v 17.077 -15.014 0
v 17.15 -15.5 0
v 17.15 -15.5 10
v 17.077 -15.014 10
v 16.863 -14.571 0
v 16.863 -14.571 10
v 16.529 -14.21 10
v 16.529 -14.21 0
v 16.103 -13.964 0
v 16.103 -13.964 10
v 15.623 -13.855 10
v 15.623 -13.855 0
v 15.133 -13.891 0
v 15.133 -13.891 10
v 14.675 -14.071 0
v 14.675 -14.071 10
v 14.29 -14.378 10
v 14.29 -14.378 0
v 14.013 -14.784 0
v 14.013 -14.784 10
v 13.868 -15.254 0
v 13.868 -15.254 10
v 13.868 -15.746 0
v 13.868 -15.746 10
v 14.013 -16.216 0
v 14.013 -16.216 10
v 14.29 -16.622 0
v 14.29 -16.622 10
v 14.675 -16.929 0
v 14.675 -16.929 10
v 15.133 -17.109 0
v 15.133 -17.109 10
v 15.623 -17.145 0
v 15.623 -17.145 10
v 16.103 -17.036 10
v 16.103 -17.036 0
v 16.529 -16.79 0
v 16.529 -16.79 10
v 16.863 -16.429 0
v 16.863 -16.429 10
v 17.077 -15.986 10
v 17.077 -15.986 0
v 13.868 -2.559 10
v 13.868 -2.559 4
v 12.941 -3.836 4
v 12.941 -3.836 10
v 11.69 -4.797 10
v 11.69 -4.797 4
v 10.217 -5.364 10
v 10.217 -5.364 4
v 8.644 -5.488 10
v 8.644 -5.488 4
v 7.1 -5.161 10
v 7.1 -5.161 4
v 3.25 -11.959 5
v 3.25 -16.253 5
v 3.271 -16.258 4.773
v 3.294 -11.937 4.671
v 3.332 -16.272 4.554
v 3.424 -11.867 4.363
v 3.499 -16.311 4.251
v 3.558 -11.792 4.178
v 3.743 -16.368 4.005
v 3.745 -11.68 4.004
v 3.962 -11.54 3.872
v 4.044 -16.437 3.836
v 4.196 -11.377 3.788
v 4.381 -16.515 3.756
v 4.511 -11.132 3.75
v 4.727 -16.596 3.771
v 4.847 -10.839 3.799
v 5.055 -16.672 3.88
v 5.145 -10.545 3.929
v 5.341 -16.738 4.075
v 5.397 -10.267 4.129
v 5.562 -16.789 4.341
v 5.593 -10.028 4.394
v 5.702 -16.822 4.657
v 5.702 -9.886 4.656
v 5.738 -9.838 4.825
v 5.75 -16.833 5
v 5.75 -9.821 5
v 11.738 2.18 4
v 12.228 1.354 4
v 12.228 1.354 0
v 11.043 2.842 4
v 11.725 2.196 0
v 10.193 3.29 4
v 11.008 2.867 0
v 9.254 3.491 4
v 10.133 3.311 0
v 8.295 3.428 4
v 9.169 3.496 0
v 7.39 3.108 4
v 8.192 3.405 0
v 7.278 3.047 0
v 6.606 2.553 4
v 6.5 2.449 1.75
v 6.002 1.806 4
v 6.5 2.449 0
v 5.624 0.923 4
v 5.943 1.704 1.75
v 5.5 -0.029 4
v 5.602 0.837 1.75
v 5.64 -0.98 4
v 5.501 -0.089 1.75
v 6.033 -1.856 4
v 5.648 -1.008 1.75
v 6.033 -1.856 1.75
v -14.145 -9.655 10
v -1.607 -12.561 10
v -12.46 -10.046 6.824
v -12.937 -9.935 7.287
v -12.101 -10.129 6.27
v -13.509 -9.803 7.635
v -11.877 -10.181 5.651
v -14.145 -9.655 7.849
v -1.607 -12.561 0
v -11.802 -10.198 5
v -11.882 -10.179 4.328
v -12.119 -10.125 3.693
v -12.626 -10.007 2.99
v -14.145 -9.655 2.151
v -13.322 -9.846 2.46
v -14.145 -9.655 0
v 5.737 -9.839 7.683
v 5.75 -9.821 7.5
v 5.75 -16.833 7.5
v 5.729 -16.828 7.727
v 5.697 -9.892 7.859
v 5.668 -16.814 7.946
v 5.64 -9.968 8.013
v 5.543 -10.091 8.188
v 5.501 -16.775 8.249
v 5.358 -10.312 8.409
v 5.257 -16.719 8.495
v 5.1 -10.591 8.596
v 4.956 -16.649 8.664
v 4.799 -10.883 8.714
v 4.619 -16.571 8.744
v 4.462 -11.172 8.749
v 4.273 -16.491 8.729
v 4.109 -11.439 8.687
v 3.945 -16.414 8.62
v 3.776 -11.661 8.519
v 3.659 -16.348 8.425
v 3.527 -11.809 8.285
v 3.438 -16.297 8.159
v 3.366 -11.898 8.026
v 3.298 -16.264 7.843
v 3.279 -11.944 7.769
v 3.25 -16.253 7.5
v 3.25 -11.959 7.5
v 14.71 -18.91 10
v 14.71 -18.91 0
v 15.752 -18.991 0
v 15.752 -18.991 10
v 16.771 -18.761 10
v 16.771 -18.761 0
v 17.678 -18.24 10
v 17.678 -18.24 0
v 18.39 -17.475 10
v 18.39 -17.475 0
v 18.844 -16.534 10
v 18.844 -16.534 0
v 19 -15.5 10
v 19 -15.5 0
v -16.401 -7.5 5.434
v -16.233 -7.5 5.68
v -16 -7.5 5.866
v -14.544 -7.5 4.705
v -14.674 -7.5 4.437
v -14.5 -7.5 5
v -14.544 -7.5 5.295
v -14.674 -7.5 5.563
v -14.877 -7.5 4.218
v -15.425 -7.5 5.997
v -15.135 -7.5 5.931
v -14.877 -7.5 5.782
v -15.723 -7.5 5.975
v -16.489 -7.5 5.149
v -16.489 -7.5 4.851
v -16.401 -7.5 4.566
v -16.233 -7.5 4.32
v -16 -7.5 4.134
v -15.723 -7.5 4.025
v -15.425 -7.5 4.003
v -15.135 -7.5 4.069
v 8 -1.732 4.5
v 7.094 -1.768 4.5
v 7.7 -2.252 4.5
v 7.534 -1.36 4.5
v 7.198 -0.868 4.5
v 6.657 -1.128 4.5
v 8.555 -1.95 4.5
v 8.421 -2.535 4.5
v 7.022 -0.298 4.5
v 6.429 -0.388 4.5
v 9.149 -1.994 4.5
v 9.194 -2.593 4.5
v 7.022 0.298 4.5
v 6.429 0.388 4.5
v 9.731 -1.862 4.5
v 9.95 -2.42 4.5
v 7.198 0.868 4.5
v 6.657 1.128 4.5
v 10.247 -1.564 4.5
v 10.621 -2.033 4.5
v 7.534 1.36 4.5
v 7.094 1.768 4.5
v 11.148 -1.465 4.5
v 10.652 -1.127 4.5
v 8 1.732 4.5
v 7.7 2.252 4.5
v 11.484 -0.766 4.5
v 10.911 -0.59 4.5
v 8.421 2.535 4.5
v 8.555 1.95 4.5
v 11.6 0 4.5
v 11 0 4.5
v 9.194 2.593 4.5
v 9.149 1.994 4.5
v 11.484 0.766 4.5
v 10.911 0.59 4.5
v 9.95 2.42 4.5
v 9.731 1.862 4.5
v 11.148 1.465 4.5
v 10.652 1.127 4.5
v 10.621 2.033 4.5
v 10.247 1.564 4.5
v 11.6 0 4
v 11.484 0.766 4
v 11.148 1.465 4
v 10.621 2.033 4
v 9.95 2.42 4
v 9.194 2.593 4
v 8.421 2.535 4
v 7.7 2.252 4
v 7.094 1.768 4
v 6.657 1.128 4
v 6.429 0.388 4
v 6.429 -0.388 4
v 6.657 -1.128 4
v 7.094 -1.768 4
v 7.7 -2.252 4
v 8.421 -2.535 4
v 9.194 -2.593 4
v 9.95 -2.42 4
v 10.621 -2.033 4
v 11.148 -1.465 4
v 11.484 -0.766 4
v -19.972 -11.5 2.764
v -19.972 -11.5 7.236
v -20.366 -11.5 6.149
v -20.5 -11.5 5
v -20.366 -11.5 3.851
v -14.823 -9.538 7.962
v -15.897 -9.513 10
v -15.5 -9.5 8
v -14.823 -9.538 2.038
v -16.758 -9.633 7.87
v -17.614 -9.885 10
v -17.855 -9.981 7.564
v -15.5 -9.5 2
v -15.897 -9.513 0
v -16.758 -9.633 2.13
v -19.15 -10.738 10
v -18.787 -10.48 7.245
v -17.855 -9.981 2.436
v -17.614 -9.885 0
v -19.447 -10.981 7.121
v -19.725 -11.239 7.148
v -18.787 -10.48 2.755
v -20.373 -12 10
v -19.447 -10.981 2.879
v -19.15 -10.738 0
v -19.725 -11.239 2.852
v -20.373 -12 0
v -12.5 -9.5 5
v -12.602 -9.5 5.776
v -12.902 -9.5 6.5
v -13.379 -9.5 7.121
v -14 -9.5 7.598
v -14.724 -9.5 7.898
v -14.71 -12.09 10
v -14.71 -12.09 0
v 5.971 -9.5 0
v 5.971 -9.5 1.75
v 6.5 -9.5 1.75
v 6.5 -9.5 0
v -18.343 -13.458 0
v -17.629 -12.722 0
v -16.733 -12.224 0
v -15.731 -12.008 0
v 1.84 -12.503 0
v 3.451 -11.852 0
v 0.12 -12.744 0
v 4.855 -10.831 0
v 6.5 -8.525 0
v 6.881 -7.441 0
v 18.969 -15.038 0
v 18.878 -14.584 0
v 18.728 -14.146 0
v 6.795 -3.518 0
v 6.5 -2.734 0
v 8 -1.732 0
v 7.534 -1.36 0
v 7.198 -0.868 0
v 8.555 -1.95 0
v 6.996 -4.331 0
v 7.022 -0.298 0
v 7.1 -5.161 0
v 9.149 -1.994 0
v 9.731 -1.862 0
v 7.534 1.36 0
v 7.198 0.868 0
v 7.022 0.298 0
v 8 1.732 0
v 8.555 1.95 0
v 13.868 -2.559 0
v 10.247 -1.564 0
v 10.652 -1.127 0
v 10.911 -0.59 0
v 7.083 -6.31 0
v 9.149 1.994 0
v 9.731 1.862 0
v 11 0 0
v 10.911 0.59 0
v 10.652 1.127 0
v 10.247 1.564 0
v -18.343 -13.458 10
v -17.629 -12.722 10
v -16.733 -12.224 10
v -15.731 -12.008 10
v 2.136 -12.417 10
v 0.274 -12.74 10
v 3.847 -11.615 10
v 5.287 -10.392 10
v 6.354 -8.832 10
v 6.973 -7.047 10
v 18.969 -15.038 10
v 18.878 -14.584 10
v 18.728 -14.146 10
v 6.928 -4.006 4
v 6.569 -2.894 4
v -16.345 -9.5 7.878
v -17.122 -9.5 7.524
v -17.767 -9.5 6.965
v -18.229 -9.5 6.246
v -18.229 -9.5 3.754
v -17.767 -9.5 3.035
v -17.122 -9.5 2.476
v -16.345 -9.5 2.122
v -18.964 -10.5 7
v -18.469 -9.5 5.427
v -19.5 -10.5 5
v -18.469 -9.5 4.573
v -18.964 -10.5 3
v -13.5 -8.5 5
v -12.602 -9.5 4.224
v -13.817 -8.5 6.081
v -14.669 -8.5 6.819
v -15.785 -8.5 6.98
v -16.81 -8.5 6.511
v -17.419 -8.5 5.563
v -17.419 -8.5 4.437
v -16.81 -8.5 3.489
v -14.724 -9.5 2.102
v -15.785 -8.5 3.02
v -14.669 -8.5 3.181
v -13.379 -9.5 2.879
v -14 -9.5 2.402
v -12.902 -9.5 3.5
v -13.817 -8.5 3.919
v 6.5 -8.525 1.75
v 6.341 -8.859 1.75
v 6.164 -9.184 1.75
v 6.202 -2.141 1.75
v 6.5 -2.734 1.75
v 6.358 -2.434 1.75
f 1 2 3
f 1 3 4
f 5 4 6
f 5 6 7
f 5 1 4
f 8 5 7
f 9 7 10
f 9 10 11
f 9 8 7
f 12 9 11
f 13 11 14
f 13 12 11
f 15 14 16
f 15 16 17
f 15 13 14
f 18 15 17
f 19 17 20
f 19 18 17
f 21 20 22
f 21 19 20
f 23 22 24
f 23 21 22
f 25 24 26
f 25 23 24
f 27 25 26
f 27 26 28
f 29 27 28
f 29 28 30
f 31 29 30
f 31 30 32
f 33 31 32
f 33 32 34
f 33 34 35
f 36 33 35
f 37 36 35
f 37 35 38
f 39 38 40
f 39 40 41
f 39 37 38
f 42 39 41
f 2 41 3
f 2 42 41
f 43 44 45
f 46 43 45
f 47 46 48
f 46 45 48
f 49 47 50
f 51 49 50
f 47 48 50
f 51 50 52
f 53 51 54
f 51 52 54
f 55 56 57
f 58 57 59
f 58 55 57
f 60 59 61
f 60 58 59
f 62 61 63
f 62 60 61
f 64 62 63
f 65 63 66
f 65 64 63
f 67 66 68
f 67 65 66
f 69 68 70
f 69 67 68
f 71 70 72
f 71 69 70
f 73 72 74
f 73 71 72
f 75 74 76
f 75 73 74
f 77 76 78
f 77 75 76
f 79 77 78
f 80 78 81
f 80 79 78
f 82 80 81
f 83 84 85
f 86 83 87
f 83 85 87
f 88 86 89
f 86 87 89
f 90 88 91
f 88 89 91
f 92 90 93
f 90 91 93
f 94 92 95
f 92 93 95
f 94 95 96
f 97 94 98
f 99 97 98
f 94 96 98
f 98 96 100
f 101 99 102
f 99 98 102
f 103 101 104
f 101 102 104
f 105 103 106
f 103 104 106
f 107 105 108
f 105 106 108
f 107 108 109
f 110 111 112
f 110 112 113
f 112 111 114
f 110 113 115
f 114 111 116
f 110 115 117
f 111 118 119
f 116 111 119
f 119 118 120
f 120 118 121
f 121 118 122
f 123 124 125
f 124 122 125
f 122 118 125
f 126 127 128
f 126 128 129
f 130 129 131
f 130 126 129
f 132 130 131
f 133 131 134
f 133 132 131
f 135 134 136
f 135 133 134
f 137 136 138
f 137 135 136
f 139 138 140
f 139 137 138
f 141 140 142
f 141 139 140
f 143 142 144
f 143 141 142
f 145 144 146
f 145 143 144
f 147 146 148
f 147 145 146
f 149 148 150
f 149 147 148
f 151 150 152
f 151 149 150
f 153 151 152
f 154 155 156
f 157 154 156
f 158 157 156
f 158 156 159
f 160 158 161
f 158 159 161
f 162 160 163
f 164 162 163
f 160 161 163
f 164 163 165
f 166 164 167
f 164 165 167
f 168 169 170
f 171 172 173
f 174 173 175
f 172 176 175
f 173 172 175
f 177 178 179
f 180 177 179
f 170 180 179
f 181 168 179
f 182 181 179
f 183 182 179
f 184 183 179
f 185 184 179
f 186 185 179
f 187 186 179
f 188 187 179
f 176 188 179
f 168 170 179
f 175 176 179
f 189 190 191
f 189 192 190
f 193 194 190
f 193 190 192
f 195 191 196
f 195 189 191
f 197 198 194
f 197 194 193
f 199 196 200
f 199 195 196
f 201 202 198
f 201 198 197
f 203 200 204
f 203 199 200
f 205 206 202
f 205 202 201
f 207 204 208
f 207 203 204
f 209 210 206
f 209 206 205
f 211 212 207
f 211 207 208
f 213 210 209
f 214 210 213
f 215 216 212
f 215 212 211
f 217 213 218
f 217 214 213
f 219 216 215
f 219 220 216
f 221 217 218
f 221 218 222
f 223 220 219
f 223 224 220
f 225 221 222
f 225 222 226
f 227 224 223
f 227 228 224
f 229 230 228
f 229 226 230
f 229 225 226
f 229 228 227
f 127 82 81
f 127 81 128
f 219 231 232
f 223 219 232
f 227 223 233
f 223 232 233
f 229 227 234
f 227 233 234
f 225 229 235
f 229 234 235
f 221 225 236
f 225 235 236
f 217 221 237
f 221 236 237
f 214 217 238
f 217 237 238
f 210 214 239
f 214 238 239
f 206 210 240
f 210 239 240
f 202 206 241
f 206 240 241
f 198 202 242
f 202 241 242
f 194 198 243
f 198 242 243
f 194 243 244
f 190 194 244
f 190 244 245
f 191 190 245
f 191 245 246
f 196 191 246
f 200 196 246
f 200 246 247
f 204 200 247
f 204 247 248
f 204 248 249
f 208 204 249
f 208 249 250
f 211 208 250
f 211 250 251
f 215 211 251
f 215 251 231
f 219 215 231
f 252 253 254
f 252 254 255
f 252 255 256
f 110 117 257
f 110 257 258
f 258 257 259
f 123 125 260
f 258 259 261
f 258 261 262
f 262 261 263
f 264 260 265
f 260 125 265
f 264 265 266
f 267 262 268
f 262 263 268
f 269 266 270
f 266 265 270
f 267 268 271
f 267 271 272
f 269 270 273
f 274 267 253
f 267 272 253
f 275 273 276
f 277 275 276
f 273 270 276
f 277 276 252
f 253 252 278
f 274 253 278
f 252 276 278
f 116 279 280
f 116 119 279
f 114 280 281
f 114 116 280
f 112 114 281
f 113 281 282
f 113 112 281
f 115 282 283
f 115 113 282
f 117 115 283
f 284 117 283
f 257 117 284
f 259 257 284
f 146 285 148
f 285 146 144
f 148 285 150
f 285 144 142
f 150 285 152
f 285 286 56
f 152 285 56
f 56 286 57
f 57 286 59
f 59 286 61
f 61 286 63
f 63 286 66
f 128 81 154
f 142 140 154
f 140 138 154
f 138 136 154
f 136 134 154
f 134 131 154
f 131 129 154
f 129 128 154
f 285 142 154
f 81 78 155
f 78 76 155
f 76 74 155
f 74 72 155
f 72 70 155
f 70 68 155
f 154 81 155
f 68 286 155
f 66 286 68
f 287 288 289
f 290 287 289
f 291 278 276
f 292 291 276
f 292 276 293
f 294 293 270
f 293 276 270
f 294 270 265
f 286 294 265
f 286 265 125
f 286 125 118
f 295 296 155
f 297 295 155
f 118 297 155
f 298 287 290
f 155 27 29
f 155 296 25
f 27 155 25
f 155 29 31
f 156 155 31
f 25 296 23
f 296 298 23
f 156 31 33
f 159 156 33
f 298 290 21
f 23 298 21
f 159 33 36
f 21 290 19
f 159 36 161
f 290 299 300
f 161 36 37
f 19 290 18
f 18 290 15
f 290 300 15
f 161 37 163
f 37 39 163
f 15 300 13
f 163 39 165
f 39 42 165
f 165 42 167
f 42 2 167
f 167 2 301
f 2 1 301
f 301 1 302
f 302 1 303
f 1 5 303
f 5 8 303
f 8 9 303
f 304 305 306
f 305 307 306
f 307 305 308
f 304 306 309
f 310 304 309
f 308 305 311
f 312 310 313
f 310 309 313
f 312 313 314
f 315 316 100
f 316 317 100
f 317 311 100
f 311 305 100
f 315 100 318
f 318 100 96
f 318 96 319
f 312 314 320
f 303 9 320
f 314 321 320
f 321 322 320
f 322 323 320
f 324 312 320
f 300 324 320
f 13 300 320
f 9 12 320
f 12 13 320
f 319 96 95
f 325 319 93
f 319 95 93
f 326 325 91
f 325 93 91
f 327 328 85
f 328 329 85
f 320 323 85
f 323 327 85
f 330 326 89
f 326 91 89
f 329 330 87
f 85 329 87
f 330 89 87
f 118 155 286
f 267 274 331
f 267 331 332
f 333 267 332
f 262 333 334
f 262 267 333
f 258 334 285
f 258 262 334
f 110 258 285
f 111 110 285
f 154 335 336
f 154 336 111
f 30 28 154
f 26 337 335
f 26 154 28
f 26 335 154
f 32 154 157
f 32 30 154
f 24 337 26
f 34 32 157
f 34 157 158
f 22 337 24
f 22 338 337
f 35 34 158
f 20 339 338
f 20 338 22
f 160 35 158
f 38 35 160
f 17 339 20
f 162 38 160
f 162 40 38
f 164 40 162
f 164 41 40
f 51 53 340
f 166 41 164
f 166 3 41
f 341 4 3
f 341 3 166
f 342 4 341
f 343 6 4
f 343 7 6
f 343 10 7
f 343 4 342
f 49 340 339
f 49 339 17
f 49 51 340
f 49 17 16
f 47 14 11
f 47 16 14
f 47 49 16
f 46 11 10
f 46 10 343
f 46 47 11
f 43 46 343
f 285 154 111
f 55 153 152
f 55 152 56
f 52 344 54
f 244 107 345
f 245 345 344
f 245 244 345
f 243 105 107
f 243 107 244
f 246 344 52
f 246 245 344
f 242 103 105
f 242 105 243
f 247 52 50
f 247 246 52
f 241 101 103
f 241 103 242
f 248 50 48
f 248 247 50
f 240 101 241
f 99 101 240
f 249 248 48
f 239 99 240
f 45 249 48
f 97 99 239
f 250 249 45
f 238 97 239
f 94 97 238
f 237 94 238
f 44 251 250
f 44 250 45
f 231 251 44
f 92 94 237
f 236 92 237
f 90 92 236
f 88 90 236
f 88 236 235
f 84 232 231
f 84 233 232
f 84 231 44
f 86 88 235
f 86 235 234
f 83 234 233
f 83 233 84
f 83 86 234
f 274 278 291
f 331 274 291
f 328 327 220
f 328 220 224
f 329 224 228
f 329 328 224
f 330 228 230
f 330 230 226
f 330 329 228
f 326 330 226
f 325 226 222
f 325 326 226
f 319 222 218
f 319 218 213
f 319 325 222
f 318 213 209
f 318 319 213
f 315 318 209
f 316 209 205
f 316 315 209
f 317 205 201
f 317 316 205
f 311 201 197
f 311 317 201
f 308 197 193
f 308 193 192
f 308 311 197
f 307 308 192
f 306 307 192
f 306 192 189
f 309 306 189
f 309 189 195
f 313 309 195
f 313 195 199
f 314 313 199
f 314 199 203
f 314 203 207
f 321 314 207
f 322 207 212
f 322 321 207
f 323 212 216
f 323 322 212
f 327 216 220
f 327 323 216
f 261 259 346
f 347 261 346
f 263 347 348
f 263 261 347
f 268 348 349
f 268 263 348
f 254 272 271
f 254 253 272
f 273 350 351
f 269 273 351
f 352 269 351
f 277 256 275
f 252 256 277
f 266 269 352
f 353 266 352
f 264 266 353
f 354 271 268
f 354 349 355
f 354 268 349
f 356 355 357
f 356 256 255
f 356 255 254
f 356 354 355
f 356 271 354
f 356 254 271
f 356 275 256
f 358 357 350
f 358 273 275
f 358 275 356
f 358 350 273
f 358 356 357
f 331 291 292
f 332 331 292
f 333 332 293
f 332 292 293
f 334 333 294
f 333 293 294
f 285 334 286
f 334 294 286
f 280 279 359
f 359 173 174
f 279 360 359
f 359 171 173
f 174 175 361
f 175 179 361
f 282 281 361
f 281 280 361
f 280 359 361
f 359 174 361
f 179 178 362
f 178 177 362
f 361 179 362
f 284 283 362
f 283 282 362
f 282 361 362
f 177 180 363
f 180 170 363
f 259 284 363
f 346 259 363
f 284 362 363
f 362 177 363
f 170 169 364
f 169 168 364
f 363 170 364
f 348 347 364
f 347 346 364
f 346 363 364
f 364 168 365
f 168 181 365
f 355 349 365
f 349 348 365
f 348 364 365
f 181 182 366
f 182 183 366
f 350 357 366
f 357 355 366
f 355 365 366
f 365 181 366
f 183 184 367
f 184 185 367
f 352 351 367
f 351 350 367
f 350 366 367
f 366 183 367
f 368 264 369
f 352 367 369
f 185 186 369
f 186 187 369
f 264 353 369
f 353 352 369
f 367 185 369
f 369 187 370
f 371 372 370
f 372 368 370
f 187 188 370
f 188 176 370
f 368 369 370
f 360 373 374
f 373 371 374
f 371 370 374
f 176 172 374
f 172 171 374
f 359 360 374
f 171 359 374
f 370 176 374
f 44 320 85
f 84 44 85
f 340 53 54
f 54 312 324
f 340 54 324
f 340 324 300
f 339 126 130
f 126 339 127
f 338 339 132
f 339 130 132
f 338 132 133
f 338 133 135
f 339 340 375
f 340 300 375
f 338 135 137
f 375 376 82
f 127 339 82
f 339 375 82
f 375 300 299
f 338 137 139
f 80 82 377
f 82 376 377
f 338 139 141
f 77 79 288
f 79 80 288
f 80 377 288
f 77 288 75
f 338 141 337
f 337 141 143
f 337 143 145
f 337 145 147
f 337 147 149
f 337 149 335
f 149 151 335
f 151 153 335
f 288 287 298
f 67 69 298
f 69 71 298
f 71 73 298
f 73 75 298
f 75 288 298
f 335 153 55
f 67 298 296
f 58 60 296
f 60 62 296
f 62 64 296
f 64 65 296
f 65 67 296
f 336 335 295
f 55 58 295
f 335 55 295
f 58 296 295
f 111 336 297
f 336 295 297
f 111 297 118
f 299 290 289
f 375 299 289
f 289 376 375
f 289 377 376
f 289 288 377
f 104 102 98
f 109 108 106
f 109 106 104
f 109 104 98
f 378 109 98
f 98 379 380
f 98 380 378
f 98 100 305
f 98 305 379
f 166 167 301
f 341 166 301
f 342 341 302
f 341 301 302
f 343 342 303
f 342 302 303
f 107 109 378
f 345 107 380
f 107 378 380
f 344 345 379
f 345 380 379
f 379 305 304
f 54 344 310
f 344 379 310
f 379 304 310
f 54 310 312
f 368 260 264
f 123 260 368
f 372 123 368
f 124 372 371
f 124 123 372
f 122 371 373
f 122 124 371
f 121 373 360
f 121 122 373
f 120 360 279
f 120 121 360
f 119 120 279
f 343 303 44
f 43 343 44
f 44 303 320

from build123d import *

# Parameters (mm, degrees)
F0_R          = 1.65
F1_DEPTH      = 10
F0_R_2        = 2.6
F2_DEPTH      = 4
F0_R_3        = 2
F3_DEPTH      = 4.5
F5_R          = 3
F6_DEPTH      = 2
F6_TAPER      = 45
F6_DEPTH_BACK = 2
F6_TAPER_BACK = -45
F7_DEPTH      = 25
F5_W          = 2
F5_H          = 1.75
F8_DEPTH      = 25


with BuildPart() as f1:
    # F0 (on Top) → F1 (new body)
    with BuildSketch(Plane.XY):
        with BuildLine():
            ThreePointArc((14.7096774194, -18.9096026482), (12.824730257, -13.2432475097), (18.7276803364, -14.1464566331))
            Line((18.7276803364, -14.1464566331), (13.8684226679, -2.5589960389))
            ThreePointArc((13.8684226679, -2.5589960389), (10.9739243006, -5.1335779779), (7.1001902802, -5.1614652017))
            ThreePointArc((7.1001902802, -5.1614652017), (4.6080160796, -11.0514527236), (-1.6067478385, -12.5612853954))
            Line((-1.6067478385, -12.5612853954), (-14.1451612903, -9.6549668888))
            ThreePointArc((-14.1451612903, -9.6549668888), (-17.6142039843, -9.8848293425), (-20.3733971724, -12))
            Line((-20.3733971724, -12), (-18.3428150172, -13.4583333333))
            ThreePointArc((-18.3428150172, -13.4583333333), (-16.7332856575, -12.2244837831), (-14.7096774194, -12.0903973518))
            Line((-14.7096774194, -12.0903973518), (14.7096774194, -18.9096026482))
        make_face()
        with BuildLine():
            ThreePointArc((14.7096774194, -18.9096026482), (17.6775985589, -18.2400847644), (19, -15.5))
            ThreePointArc((19, -15.5), (18.9312447579, -14.8096671735), (18.7276803364, -14.1464566331))
            ThreePointArc((18.7276803364, -14.1464566331), (12.824730257, -13.2432475097), (14.7096774194, -18.9096026482))
        make_face()
        with Locations((15.5, -15.5)):
            Circle(F0_R, mode=Mode.SUBTRACT)
    extrude(amount=F1_DEPTH)

    # F0 (on Top) → F2 (join)
    with BuildSketch(Plane.XY):
        with BuildLine():
            ThreePointArc((7.1001902802, -5.1614652017), (10.9739243006, -5.1335779779), (13.8684226679, -2.5589960389))
            Line((13.8684226679, -2.5589960389), (12.2276803364, 1.3535433669))
            ThreePointArc((12.2276803364, 1.3535433669), (7.3899296254, 3.1076797436), (6.0326682233, -1.856055529))
            ThreePointArc((6.0326682233, -1.856055529), (6.7712204508, -3.4426205691), (7.1001902802, -5.1614652017))
        make_face()
        with Locations((9, 0)):
            Circle(F0_R_2, mode=Mode.SUBTRACT)
    extrude(amount=F2_DEPTH)

    # F0 (on Top) → F3 (join)
    with BuildSketch(Plane.XY):
        with Locations((9, 0)):
            Circle(F0_R_2)
        with Locations((9, 0)):
            Circle(F0_R_3, mode=Mode.SUBTRACT)
    extrude(amount=F3_DEPTH)

    # F5 (on offset) → F6 (join, two sides)
    with BuildSketch(Plane.XZ.offset(9.5)) as f6_sk:
        with Locations((-15.5, 5)):
            Circle(F5_R)
    extrude(amount=-F6_DEPTH, taper=F6_TAPER)
    extrude(f6_sk.sketch, amount=F6_DEPTH_BACK, taper=F6_TAPER_BACK)

    # F5 (on offset) → F7 (cut)
    with BuildSketch(Plane.XZ.offset(9.5)):
        with BuildLine():
            ThreePointArc((4.5000000108, 6.25), (3.6161165273, 5.8838834803), (3.25, 5))
            ThreePointArc((3.25, 5), (4.5, 3.75), (5.75, 5))
            ThreePointArc((5.75, 5), (5.3838834803, 5.8838834727), (4.5000000108, 6.25))
        make_face()
        with BuildLine():
            ThreePointArc((3.25, 7.5), (3.6161165273, 6.6161165197), (4.5000000108, 6.25))
            ThreePointArc((4.5000000108, 6.25), (5.3838834803, 6.6161165273), (5.75, 7.5))
            ThreePointArc((5.75, 7.5), (4.5, 8.75), (3.25, 7.5))
        make_face()
        with BuildLine():
            Line((3.25, 7.5), (3.25, 5))
            ThreePointArc((3.25, 5), (3.6161165273, 5.8838834803), (4.5000000108, 6.25))
            ThreePointArc((4.5000000108, 6.25), (3.6161165273, 6.6161165197), (3.25, 7.5))
        make_face()
        with BuildLine():
            ThreePointArc((4.5000000108, 6.25), (5.3838834803, 5.8838834727), (5.75, 5))
            Line((5.75, 5), (5.75, 7.5))
            ThreePointArc((5.75, 7.5), (5.3838834803, 6.6161165273), (4.5000000108, 6.25))
        make_face()
    extrude(amount=F7_DEPTH, mode=Mode.SUBTRACT)

    # F5 (on offset) → F8 (cut)
    with BuildSketch(Plane.XZ.offset(9.5)):
        with Locations((5.5, 0.875)):
            Rectangle(F5_W, F5_H)
    extrude(amount=-F8_DEPTH, mode=Mode.SUBTRACT)


solid = f1.part
